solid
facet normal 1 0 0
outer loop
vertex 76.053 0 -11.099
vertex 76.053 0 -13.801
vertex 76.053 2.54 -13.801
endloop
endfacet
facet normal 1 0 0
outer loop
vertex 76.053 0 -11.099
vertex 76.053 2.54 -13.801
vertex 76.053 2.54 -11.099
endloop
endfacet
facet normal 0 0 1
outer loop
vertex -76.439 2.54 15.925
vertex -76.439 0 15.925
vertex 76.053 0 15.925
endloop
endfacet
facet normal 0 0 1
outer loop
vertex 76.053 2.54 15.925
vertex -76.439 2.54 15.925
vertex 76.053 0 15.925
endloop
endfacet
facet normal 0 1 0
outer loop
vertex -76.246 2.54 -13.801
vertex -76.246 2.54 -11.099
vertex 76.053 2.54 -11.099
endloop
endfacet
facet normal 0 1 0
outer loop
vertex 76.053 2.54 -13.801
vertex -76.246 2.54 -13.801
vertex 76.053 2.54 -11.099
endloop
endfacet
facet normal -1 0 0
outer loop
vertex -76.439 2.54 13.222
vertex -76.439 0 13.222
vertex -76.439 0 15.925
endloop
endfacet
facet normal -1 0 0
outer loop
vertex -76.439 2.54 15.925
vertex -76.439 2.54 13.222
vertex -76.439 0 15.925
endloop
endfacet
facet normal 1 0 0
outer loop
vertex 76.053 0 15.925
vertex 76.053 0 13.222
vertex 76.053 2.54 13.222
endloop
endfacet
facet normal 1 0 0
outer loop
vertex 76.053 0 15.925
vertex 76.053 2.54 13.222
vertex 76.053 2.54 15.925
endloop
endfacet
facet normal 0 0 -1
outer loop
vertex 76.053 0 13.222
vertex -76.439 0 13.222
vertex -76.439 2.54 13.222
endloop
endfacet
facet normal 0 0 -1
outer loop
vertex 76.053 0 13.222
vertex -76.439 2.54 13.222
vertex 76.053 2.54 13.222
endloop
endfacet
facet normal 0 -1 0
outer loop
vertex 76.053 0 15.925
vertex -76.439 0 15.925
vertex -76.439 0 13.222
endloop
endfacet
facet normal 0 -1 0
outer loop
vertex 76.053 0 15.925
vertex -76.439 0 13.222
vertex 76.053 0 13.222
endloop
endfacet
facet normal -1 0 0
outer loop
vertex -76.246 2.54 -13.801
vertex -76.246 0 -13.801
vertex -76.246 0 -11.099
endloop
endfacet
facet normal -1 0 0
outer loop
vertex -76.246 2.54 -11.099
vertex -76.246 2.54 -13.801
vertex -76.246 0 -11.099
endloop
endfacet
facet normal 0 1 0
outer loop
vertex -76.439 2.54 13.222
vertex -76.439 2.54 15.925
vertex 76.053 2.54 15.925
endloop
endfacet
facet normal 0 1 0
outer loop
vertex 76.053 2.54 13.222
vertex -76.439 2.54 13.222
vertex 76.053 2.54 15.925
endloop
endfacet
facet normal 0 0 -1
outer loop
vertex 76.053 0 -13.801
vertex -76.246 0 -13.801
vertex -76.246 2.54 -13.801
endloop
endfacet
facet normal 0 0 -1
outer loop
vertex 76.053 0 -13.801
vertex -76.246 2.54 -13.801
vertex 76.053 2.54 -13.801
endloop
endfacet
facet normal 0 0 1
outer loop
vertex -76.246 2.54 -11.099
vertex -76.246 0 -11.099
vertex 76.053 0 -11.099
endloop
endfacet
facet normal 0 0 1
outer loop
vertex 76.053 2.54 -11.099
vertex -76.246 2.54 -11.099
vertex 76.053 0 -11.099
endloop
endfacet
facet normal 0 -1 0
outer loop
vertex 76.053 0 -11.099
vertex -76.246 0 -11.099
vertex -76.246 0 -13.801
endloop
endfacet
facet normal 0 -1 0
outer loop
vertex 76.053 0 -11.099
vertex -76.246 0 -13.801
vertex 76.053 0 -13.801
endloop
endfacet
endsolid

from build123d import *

# Parameters (mm, degrees)
F0_W     = 152.49192
F0_H     = 2.702389
F1_DEPTH = 2.54
F0_W_2   = 152.29889
F2_DEPTH = 2.54


with BuildPart() as f1:
    # F0 (on Front) → F1 (new body)
    with BuildSketch(Plane.XZ):
        with Locations((-0.193026, 14.573594)):
            Rectangle(F0_W, F0_H)
    extrude(amount=-F1_DEPTH)

    # F0 (on Front) → F2 (join)
    with BuildSketch(Plane.XZ):
        with Locations((-0.096511, -12.45029)):
            Rectangle(F0_W_2, F0_H)
        with Locations((-0.193026, 14.573594)):
            Rectangle(F0_W, F0_H)
    extrude(amount=-F2_DEPTH)


solid = f1.part
